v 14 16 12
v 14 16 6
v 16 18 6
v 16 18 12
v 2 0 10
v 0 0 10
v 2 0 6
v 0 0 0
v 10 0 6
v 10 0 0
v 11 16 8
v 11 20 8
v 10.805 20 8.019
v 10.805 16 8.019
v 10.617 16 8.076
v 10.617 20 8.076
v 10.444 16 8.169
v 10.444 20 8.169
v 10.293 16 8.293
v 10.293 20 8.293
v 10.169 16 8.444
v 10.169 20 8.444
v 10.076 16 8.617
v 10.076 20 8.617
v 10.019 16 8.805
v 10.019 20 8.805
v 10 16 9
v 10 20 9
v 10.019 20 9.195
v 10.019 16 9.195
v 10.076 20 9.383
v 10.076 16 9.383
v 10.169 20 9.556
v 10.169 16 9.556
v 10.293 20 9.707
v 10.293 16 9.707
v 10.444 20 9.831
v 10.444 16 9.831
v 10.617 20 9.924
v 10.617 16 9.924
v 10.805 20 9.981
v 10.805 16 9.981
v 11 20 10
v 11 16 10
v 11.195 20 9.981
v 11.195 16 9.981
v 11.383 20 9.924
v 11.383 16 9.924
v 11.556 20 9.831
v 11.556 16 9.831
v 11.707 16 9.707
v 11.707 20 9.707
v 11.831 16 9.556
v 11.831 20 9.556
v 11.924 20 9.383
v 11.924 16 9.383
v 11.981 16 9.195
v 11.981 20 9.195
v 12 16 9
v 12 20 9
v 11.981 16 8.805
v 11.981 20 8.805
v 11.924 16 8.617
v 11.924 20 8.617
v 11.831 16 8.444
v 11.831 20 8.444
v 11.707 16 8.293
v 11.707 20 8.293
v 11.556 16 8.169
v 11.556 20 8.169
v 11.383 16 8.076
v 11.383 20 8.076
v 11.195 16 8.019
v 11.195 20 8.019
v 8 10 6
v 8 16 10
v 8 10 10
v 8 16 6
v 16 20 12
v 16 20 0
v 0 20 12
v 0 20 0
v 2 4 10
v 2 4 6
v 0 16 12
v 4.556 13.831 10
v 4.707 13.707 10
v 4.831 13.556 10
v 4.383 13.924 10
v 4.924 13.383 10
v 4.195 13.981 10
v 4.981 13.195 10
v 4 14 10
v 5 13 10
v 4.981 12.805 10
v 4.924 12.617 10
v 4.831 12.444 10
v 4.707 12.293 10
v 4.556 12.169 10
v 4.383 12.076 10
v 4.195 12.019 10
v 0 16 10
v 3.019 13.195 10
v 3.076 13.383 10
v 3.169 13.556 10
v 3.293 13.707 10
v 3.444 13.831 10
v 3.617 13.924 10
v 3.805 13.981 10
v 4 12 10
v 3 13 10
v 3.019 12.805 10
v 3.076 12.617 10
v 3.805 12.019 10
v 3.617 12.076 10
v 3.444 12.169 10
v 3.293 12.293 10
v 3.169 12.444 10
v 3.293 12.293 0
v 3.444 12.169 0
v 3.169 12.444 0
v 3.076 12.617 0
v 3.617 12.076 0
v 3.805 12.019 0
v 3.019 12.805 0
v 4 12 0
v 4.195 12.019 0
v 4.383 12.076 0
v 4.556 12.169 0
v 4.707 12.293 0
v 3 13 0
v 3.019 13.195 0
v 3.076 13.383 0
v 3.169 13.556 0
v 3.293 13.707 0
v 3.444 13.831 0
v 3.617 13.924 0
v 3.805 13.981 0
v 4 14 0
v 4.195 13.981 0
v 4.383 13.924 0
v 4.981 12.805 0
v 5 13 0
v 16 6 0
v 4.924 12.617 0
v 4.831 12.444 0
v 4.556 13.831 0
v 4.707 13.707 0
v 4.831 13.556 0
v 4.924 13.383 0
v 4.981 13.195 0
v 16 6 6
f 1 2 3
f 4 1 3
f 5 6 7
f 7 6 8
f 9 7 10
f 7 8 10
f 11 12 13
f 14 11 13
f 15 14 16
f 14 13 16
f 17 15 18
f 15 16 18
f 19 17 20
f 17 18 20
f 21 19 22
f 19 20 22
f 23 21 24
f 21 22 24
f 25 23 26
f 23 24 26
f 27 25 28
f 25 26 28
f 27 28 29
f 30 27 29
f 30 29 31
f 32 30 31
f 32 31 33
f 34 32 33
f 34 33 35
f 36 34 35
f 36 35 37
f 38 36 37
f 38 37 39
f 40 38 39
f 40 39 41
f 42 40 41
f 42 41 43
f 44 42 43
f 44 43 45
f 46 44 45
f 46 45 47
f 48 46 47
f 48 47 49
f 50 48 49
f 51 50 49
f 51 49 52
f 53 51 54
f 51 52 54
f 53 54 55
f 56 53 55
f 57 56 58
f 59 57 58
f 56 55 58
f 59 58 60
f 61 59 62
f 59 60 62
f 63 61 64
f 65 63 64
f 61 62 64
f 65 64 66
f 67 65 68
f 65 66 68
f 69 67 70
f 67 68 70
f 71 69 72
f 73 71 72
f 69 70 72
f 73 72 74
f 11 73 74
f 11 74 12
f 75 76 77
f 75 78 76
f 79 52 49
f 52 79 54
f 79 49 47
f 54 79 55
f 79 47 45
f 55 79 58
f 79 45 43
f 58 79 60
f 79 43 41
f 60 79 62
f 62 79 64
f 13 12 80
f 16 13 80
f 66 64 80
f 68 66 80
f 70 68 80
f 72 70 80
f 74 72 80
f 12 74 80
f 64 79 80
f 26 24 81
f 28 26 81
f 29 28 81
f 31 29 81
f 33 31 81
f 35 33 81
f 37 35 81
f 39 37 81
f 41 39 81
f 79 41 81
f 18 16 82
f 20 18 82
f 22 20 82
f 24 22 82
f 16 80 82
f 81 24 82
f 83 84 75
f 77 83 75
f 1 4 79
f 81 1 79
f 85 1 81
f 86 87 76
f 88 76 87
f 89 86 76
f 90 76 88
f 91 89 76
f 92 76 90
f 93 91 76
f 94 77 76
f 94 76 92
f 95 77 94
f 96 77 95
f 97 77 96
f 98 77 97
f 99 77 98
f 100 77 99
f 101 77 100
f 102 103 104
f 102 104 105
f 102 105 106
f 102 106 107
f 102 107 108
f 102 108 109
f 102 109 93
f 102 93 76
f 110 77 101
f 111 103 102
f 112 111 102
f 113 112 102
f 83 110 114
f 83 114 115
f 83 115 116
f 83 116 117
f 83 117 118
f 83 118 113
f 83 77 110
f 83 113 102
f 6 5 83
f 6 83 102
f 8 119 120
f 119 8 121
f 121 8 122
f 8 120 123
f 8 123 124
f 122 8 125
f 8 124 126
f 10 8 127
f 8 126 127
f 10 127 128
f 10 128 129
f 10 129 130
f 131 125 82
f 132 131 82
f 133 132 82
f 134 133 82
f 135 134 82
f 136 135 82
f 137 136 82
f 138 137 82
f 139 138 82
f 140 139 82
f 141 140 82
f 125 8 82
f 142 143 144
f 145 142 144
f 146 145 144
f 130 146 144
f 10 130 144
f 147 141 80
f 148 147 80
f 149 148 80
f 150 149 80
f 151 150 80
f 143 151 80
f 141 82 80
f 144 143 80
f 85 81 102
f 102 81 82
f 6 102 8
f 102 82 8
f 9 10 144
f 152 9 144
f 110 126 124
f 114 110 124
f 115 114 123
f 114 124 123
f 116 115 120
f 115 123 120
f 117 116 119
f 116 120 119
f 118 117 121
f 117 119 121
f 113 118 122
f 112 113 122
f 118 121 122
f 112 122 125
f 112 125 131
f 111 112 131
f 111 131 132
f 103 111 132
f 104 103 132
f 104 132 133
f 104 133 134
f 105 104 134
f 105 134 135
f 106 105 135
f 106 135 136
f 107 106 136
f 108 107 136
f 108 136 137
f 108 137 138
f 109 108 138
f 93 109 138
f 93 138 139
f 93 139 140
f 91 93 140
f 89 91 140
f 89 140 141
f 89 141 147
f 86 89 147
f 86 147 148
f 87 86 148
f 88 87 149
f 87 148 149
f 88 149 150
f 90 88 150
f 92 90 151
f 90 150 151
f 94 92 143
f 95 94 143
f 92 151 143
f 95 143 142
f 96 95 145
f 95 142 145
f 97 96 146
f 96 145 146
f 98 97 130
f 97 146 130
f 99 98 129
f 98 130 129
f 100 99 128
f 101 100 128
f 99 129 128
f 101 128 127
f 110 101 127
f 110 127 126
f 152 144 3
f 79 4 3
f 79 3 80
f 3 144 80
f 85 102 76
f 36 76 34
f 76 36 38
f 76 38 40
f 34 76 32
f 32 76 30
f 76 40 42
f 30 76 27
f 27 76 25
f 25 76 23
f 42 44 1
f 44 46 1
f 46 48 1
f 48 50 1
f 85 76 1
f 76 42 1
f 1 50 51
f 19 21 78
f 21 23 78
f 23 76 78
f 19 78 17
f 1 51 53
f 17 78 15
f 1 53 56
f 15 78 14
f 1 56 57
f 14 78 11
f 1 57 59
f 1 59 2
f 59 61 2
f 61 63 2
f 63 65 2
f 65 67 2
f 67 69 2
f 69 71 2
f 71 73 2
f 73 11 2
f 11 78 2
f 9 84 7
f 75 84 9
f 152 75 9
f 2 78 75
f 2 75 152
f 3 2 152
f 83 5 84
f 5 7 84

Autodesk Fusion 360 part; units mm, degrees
sketch "Sketch1" plane through (0, 0, 0) normal (0, 0, 1) x (1, 0, 0)
  line L0 (0, 0) -> (0, 20)
  line L1 (0, 20) -> (16, 20)
  line L2 (0, 0) -> (6, 0)
  line L3 (0, 0) -> (10, 0)
  line L4 (16, 20) -> (16, 6)
  line L5 (10, 0) -> (16, 6)
  dimension "d1" = 20
  dimension "d2" = 16
  dimension "d3" = 14
extrude "Extrude1" add sketch "Sketch1" along normal blind 6
sketch "Sketch2" plane through (0, 0, 6) normal (0, 0, 1) x (-1, 0, 0)
  line L0 (0, 0) -> (-10, 0)
  line L1 (-10, 0) -> (-16, -6)
  line L2 (-16, -6) -> (-16, -20)
  line L3 (-16, -20) -> (0, -20)
  line L4 (0, -20) -> (0, 0)
  line L5 (0, 0) -> (-2, 0)
  line L6 (-2, 0) -> (-2, -4)
  line L7 (0, 0) -> (0, -16)
  line L8 (0, -16) -> (-8, -16)
  line L9 (-8, -16) -> (-8, -10)
  line L10 (-2, -4) -> (-8, -10)
  dimension "d6" = 2
  dimension "d7" = 4
  dimension "d8" = 16
  dimension "d9" = 8
  dimension "d10" = 6
extrude "Extrude2" add sketch "Sketch2" along normal blind 4 contours L0 L4 L5 L6 L7 L8 L9 L10
sketch "Sketch3" plane through (0, 0, 6) normal (0, 0, 1) x (-1, 0, 0)
  line L0 (-2, -4) -> (-2, 0)
  line L1 (-2, 0) -> (-10, 0)
  line L2 (-10, 0) -> (-16, -6)
  line L3 (-16, -6) -> (-16, -20)
  line L4 (-16, -20) -> (0, -20)
  line L5 (0, -20) -> (0, -16)
  line L6 (0, -16) -> (-8, -16)
  line L7 (-8, -16) -> (-8, -10)
  line L8 (-8, -10) -> (-2, -4)
  line L9 (-16, -20) -> (-16, -18)
  line L10 (-8, -16) -> (-14, -16)
  line L11 (-14, -16) -> (-16, -18)
  line L12 (-16, -20) -> (0, -20)
  line L13 (0, -16) -> (0, -20)
  line L14 (0, -16) -> (-8, -16)
  dimension "d13" = 2
  dimension "d14" = 6
extrude "Extrude3" add sketch "Sketch3" along normal blind 6 contours L3 L4 L5 L6 L9 L10 L11 L12 L13 L14
sketch "Sketch4" plane through (0, 0, 10) normal (0, 0, 1) x (-1, 0, 0)
  line L0 (0, 0) -> (-2, 0)
  line L1 (-2, 0) -> (-2, -4)
  line L2 (-2, -4) -> (-8, -10)
  line L3 (-8, -10) -> (-8, -16)
  line L4 (-8, -16) -> (0, -16)
  line L5 (0, -16) -> (0, 0)
  line L6 (-8, -16) -> (-8, -13)
  line L7 (-8, -13) -> (-4, -13)
  dimension "d17" = 4
hole "Hole1" at (4, 13, 10) direction (0, 0, -1) diameter 2 depth 12 tip angle 118
sketch "Sketch5" plane through (0, 16, 0) normal (0, -1, 0) x (1, 0, 0)
  line L0 (0, 10) -> (8, 10)
  line L1 (8, 10) -> (8, 6)
  line L2 (8, 6) -> (14, 6)
  line L3 (14, 6) -> (14, 12)
  line L4 (14, 12) -> (0, 12)
  line L5 (0, 12) -> (0, 10)
  line L6 (14, 12) -> (11, 12)
  line L7 (11, 12) -> (11, 9)
  dimension "d21" = 3
  dimension "d22" = 3
hole "Hole2" at (11, 16, 9) direction (0, 1, 0) diameter 2 depth 12 tip angle 118
